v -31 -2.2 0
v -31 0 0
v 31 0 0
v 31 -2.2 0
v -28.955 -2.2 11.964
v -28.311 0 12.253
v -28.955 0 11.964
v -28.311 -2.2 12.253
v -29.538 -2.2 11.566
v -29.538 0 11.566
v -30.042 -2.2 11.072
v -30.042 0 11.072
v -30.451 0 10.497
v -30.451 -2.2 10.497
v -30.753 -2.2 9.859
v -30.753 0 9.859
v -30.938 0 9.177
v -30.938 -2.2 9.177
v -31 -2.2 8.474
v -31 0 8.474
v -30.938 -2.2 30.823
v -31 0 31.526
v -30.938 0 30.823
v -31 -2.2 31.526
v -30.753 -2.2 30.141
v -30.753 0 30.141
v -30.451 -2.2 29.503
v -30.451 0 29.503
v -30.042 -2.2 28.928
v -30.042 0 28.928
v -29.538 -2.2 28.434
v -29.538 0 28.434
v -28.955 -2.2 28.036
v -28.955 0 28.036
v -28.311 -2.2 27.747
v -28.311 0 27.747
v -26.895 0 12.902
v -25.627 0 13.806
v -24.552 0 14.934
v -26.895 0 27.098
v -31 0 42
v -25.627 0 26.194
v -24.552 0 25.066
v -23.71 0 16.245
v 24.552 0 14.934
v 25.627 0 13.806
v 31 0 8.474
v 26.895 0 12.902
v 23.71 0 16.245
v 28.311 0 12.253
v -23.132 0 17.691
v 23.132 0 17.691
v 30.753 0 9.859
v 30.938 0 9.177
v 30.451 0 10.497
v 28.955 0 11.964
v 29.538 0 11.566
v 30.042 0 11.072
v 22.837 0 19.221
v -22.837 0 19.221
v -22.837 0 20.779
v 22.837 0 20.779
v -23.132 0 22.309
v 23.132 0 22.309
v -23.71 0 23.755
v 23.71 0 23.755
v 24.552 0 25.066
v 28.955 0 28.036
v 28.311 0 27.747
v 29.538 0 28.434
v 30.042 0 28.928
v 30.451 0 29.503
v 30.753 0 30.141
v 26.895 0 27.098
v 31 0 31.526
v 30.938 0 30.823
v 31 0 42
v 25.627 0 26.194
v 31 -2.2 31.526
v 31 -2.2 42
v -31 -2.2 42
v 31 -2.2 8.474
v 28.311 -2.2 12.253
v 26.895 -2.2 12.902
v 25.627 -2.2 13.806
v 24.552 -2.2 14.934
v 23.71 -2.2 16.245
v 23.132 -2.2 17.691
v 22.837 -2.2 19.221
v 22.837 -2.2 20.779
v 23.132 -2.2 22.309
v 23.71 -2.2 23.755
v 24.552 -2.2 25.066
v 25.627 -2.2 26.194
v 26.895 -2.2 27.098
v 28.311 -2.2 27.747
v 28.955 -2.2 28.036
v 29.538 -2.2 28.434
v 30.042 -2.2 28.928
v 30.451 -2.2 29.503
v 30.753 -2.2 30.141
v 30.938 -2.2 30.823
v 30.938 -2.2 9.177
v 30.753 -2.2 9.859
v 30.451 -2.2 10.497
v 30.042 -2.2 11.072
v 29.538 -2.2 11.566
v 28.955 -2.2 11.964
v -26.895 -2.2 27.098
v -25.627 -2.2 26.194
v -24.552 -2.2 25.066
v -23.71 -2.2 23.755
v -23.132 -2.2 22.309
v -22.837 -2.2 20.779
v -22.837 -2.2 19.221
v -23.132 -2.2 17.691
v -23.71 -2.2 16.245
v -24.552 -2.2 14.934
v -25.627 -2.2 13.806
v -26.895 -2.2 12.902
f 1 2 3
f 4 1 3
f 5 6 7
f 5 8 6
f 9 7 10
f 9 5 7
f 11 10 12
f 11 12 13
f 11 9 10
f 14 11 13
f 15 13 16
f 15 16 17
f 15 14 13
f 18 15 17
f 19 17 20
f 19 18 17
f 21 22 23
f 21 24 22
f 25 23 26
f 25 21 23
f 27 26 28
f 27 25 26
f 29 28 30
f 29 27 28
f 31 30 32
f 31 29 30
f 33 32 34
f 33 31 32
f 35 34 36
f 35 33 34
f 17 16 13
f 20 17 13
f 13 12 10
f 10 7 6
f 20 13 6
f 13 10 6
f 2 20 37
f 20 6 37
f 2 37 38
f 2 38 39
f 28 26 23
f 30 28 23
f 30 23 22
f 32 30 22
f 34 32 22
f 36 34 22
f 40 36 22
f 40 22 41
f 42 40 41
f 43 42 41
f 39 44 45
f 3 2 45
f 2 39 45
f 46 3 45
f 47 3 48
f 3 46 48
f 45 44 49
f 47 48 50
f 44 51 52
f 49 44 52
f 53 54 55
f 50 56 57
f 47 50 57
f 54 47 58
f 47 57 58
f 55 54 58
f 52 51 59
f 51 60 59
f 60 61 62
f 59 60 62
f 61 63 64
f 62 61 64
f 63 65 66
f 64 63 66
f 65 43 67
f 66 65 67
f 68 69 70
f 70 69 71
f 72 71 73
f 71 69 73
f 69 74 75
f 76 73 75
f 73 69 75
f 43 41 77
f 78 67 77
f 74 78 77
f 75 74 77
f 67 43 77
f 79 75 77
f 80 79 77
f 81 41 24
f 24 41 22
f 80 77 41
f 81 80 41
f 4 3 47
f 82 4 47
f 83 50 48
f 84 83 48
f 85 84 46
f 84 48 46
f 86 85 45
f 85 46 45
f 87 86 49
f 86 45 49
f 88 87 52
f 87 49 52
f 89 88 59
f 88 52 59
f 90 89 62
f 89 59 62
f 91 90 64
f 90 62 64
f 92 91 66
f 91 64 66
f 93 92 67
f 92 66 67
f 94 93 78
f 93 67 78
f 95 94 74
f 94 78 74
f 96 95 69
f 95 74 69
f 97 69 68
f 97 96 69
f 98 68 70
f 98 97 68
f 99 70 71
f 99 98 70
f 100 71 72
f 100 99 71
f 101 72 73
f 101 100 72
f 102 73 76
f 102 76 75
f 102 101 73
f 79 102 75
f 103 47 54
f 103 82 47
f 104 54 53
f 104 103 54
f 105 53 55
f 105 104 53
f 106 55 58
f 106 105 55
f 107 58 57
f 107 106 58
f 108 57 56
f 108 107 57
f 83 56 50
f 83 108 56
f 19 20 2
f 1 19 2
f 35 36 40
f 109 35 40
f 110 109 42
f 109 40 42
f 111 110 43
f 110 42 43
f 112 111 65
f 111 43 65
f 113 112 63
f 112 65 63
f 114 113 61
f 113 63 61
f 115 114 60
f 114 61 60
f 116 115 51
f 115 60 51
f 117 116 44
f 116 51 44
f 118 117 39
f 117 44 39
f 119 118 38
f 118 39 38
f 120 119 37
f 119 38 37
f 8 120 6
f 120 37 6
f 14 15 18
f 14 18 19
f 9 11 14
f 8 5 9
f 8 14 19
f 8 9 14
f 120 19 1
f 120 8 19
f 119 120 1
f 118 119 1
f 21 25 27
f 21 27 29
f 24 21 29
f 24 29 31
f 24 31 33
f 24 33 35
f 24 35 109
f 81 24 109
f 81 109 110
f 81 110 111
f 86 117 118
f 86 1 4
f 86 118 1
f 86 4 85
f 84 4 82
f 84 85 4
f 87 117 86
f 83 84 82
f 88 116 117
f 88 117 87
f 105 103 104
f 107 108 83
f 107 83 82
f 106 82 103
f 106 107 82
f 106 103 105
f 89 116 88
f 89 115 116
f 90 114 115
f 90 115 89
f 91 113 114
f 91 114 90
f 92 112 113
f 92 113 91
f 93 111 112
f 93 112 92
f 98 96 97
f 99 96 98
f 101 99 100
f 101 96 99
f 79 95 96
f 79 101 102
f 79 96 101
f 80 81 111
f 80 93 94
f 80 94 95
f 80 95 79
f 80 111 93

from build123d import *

# Parameters (mm, degrees)
F1_DEPTH = 2.2
F2_R     = 4


with BuildPart() as f1:
    # F0 (on Front) → F1 (new body)
    with BuildSketch(Plane.XZ):
        with BuildLine():
            Line((-31, 0), (31, 0))
            Line((31, 0), (31, 11.8))
            ThreePointArc((31, 11.8), (22.8, 20), (31, 28.2))
            Line((31, 28.2), (31, 42))
            Line((31, 42), (-31, 42))
            Line((-31, 42), (-31, 28.2))
            ThreePointArc((-31, 28.2), (-22.8, 20), (-31, 11.8))
            Line((-31, 11.8), (-31, 0))
        make_face()
    extrude(amount=F1_DEPTH)

    # F2
    f2_edges = [f1.edges().sort_by_distance(p)[0] for p in [
        (-31, -1.1, 11.8),
        (31, -1.1, 11.8),
        (31, -1.1, 28.2),
        (-31, -1.1, 28.2),
    ]]
    fillet(f2_edges, radius=F2_R)


solid = f1.part
